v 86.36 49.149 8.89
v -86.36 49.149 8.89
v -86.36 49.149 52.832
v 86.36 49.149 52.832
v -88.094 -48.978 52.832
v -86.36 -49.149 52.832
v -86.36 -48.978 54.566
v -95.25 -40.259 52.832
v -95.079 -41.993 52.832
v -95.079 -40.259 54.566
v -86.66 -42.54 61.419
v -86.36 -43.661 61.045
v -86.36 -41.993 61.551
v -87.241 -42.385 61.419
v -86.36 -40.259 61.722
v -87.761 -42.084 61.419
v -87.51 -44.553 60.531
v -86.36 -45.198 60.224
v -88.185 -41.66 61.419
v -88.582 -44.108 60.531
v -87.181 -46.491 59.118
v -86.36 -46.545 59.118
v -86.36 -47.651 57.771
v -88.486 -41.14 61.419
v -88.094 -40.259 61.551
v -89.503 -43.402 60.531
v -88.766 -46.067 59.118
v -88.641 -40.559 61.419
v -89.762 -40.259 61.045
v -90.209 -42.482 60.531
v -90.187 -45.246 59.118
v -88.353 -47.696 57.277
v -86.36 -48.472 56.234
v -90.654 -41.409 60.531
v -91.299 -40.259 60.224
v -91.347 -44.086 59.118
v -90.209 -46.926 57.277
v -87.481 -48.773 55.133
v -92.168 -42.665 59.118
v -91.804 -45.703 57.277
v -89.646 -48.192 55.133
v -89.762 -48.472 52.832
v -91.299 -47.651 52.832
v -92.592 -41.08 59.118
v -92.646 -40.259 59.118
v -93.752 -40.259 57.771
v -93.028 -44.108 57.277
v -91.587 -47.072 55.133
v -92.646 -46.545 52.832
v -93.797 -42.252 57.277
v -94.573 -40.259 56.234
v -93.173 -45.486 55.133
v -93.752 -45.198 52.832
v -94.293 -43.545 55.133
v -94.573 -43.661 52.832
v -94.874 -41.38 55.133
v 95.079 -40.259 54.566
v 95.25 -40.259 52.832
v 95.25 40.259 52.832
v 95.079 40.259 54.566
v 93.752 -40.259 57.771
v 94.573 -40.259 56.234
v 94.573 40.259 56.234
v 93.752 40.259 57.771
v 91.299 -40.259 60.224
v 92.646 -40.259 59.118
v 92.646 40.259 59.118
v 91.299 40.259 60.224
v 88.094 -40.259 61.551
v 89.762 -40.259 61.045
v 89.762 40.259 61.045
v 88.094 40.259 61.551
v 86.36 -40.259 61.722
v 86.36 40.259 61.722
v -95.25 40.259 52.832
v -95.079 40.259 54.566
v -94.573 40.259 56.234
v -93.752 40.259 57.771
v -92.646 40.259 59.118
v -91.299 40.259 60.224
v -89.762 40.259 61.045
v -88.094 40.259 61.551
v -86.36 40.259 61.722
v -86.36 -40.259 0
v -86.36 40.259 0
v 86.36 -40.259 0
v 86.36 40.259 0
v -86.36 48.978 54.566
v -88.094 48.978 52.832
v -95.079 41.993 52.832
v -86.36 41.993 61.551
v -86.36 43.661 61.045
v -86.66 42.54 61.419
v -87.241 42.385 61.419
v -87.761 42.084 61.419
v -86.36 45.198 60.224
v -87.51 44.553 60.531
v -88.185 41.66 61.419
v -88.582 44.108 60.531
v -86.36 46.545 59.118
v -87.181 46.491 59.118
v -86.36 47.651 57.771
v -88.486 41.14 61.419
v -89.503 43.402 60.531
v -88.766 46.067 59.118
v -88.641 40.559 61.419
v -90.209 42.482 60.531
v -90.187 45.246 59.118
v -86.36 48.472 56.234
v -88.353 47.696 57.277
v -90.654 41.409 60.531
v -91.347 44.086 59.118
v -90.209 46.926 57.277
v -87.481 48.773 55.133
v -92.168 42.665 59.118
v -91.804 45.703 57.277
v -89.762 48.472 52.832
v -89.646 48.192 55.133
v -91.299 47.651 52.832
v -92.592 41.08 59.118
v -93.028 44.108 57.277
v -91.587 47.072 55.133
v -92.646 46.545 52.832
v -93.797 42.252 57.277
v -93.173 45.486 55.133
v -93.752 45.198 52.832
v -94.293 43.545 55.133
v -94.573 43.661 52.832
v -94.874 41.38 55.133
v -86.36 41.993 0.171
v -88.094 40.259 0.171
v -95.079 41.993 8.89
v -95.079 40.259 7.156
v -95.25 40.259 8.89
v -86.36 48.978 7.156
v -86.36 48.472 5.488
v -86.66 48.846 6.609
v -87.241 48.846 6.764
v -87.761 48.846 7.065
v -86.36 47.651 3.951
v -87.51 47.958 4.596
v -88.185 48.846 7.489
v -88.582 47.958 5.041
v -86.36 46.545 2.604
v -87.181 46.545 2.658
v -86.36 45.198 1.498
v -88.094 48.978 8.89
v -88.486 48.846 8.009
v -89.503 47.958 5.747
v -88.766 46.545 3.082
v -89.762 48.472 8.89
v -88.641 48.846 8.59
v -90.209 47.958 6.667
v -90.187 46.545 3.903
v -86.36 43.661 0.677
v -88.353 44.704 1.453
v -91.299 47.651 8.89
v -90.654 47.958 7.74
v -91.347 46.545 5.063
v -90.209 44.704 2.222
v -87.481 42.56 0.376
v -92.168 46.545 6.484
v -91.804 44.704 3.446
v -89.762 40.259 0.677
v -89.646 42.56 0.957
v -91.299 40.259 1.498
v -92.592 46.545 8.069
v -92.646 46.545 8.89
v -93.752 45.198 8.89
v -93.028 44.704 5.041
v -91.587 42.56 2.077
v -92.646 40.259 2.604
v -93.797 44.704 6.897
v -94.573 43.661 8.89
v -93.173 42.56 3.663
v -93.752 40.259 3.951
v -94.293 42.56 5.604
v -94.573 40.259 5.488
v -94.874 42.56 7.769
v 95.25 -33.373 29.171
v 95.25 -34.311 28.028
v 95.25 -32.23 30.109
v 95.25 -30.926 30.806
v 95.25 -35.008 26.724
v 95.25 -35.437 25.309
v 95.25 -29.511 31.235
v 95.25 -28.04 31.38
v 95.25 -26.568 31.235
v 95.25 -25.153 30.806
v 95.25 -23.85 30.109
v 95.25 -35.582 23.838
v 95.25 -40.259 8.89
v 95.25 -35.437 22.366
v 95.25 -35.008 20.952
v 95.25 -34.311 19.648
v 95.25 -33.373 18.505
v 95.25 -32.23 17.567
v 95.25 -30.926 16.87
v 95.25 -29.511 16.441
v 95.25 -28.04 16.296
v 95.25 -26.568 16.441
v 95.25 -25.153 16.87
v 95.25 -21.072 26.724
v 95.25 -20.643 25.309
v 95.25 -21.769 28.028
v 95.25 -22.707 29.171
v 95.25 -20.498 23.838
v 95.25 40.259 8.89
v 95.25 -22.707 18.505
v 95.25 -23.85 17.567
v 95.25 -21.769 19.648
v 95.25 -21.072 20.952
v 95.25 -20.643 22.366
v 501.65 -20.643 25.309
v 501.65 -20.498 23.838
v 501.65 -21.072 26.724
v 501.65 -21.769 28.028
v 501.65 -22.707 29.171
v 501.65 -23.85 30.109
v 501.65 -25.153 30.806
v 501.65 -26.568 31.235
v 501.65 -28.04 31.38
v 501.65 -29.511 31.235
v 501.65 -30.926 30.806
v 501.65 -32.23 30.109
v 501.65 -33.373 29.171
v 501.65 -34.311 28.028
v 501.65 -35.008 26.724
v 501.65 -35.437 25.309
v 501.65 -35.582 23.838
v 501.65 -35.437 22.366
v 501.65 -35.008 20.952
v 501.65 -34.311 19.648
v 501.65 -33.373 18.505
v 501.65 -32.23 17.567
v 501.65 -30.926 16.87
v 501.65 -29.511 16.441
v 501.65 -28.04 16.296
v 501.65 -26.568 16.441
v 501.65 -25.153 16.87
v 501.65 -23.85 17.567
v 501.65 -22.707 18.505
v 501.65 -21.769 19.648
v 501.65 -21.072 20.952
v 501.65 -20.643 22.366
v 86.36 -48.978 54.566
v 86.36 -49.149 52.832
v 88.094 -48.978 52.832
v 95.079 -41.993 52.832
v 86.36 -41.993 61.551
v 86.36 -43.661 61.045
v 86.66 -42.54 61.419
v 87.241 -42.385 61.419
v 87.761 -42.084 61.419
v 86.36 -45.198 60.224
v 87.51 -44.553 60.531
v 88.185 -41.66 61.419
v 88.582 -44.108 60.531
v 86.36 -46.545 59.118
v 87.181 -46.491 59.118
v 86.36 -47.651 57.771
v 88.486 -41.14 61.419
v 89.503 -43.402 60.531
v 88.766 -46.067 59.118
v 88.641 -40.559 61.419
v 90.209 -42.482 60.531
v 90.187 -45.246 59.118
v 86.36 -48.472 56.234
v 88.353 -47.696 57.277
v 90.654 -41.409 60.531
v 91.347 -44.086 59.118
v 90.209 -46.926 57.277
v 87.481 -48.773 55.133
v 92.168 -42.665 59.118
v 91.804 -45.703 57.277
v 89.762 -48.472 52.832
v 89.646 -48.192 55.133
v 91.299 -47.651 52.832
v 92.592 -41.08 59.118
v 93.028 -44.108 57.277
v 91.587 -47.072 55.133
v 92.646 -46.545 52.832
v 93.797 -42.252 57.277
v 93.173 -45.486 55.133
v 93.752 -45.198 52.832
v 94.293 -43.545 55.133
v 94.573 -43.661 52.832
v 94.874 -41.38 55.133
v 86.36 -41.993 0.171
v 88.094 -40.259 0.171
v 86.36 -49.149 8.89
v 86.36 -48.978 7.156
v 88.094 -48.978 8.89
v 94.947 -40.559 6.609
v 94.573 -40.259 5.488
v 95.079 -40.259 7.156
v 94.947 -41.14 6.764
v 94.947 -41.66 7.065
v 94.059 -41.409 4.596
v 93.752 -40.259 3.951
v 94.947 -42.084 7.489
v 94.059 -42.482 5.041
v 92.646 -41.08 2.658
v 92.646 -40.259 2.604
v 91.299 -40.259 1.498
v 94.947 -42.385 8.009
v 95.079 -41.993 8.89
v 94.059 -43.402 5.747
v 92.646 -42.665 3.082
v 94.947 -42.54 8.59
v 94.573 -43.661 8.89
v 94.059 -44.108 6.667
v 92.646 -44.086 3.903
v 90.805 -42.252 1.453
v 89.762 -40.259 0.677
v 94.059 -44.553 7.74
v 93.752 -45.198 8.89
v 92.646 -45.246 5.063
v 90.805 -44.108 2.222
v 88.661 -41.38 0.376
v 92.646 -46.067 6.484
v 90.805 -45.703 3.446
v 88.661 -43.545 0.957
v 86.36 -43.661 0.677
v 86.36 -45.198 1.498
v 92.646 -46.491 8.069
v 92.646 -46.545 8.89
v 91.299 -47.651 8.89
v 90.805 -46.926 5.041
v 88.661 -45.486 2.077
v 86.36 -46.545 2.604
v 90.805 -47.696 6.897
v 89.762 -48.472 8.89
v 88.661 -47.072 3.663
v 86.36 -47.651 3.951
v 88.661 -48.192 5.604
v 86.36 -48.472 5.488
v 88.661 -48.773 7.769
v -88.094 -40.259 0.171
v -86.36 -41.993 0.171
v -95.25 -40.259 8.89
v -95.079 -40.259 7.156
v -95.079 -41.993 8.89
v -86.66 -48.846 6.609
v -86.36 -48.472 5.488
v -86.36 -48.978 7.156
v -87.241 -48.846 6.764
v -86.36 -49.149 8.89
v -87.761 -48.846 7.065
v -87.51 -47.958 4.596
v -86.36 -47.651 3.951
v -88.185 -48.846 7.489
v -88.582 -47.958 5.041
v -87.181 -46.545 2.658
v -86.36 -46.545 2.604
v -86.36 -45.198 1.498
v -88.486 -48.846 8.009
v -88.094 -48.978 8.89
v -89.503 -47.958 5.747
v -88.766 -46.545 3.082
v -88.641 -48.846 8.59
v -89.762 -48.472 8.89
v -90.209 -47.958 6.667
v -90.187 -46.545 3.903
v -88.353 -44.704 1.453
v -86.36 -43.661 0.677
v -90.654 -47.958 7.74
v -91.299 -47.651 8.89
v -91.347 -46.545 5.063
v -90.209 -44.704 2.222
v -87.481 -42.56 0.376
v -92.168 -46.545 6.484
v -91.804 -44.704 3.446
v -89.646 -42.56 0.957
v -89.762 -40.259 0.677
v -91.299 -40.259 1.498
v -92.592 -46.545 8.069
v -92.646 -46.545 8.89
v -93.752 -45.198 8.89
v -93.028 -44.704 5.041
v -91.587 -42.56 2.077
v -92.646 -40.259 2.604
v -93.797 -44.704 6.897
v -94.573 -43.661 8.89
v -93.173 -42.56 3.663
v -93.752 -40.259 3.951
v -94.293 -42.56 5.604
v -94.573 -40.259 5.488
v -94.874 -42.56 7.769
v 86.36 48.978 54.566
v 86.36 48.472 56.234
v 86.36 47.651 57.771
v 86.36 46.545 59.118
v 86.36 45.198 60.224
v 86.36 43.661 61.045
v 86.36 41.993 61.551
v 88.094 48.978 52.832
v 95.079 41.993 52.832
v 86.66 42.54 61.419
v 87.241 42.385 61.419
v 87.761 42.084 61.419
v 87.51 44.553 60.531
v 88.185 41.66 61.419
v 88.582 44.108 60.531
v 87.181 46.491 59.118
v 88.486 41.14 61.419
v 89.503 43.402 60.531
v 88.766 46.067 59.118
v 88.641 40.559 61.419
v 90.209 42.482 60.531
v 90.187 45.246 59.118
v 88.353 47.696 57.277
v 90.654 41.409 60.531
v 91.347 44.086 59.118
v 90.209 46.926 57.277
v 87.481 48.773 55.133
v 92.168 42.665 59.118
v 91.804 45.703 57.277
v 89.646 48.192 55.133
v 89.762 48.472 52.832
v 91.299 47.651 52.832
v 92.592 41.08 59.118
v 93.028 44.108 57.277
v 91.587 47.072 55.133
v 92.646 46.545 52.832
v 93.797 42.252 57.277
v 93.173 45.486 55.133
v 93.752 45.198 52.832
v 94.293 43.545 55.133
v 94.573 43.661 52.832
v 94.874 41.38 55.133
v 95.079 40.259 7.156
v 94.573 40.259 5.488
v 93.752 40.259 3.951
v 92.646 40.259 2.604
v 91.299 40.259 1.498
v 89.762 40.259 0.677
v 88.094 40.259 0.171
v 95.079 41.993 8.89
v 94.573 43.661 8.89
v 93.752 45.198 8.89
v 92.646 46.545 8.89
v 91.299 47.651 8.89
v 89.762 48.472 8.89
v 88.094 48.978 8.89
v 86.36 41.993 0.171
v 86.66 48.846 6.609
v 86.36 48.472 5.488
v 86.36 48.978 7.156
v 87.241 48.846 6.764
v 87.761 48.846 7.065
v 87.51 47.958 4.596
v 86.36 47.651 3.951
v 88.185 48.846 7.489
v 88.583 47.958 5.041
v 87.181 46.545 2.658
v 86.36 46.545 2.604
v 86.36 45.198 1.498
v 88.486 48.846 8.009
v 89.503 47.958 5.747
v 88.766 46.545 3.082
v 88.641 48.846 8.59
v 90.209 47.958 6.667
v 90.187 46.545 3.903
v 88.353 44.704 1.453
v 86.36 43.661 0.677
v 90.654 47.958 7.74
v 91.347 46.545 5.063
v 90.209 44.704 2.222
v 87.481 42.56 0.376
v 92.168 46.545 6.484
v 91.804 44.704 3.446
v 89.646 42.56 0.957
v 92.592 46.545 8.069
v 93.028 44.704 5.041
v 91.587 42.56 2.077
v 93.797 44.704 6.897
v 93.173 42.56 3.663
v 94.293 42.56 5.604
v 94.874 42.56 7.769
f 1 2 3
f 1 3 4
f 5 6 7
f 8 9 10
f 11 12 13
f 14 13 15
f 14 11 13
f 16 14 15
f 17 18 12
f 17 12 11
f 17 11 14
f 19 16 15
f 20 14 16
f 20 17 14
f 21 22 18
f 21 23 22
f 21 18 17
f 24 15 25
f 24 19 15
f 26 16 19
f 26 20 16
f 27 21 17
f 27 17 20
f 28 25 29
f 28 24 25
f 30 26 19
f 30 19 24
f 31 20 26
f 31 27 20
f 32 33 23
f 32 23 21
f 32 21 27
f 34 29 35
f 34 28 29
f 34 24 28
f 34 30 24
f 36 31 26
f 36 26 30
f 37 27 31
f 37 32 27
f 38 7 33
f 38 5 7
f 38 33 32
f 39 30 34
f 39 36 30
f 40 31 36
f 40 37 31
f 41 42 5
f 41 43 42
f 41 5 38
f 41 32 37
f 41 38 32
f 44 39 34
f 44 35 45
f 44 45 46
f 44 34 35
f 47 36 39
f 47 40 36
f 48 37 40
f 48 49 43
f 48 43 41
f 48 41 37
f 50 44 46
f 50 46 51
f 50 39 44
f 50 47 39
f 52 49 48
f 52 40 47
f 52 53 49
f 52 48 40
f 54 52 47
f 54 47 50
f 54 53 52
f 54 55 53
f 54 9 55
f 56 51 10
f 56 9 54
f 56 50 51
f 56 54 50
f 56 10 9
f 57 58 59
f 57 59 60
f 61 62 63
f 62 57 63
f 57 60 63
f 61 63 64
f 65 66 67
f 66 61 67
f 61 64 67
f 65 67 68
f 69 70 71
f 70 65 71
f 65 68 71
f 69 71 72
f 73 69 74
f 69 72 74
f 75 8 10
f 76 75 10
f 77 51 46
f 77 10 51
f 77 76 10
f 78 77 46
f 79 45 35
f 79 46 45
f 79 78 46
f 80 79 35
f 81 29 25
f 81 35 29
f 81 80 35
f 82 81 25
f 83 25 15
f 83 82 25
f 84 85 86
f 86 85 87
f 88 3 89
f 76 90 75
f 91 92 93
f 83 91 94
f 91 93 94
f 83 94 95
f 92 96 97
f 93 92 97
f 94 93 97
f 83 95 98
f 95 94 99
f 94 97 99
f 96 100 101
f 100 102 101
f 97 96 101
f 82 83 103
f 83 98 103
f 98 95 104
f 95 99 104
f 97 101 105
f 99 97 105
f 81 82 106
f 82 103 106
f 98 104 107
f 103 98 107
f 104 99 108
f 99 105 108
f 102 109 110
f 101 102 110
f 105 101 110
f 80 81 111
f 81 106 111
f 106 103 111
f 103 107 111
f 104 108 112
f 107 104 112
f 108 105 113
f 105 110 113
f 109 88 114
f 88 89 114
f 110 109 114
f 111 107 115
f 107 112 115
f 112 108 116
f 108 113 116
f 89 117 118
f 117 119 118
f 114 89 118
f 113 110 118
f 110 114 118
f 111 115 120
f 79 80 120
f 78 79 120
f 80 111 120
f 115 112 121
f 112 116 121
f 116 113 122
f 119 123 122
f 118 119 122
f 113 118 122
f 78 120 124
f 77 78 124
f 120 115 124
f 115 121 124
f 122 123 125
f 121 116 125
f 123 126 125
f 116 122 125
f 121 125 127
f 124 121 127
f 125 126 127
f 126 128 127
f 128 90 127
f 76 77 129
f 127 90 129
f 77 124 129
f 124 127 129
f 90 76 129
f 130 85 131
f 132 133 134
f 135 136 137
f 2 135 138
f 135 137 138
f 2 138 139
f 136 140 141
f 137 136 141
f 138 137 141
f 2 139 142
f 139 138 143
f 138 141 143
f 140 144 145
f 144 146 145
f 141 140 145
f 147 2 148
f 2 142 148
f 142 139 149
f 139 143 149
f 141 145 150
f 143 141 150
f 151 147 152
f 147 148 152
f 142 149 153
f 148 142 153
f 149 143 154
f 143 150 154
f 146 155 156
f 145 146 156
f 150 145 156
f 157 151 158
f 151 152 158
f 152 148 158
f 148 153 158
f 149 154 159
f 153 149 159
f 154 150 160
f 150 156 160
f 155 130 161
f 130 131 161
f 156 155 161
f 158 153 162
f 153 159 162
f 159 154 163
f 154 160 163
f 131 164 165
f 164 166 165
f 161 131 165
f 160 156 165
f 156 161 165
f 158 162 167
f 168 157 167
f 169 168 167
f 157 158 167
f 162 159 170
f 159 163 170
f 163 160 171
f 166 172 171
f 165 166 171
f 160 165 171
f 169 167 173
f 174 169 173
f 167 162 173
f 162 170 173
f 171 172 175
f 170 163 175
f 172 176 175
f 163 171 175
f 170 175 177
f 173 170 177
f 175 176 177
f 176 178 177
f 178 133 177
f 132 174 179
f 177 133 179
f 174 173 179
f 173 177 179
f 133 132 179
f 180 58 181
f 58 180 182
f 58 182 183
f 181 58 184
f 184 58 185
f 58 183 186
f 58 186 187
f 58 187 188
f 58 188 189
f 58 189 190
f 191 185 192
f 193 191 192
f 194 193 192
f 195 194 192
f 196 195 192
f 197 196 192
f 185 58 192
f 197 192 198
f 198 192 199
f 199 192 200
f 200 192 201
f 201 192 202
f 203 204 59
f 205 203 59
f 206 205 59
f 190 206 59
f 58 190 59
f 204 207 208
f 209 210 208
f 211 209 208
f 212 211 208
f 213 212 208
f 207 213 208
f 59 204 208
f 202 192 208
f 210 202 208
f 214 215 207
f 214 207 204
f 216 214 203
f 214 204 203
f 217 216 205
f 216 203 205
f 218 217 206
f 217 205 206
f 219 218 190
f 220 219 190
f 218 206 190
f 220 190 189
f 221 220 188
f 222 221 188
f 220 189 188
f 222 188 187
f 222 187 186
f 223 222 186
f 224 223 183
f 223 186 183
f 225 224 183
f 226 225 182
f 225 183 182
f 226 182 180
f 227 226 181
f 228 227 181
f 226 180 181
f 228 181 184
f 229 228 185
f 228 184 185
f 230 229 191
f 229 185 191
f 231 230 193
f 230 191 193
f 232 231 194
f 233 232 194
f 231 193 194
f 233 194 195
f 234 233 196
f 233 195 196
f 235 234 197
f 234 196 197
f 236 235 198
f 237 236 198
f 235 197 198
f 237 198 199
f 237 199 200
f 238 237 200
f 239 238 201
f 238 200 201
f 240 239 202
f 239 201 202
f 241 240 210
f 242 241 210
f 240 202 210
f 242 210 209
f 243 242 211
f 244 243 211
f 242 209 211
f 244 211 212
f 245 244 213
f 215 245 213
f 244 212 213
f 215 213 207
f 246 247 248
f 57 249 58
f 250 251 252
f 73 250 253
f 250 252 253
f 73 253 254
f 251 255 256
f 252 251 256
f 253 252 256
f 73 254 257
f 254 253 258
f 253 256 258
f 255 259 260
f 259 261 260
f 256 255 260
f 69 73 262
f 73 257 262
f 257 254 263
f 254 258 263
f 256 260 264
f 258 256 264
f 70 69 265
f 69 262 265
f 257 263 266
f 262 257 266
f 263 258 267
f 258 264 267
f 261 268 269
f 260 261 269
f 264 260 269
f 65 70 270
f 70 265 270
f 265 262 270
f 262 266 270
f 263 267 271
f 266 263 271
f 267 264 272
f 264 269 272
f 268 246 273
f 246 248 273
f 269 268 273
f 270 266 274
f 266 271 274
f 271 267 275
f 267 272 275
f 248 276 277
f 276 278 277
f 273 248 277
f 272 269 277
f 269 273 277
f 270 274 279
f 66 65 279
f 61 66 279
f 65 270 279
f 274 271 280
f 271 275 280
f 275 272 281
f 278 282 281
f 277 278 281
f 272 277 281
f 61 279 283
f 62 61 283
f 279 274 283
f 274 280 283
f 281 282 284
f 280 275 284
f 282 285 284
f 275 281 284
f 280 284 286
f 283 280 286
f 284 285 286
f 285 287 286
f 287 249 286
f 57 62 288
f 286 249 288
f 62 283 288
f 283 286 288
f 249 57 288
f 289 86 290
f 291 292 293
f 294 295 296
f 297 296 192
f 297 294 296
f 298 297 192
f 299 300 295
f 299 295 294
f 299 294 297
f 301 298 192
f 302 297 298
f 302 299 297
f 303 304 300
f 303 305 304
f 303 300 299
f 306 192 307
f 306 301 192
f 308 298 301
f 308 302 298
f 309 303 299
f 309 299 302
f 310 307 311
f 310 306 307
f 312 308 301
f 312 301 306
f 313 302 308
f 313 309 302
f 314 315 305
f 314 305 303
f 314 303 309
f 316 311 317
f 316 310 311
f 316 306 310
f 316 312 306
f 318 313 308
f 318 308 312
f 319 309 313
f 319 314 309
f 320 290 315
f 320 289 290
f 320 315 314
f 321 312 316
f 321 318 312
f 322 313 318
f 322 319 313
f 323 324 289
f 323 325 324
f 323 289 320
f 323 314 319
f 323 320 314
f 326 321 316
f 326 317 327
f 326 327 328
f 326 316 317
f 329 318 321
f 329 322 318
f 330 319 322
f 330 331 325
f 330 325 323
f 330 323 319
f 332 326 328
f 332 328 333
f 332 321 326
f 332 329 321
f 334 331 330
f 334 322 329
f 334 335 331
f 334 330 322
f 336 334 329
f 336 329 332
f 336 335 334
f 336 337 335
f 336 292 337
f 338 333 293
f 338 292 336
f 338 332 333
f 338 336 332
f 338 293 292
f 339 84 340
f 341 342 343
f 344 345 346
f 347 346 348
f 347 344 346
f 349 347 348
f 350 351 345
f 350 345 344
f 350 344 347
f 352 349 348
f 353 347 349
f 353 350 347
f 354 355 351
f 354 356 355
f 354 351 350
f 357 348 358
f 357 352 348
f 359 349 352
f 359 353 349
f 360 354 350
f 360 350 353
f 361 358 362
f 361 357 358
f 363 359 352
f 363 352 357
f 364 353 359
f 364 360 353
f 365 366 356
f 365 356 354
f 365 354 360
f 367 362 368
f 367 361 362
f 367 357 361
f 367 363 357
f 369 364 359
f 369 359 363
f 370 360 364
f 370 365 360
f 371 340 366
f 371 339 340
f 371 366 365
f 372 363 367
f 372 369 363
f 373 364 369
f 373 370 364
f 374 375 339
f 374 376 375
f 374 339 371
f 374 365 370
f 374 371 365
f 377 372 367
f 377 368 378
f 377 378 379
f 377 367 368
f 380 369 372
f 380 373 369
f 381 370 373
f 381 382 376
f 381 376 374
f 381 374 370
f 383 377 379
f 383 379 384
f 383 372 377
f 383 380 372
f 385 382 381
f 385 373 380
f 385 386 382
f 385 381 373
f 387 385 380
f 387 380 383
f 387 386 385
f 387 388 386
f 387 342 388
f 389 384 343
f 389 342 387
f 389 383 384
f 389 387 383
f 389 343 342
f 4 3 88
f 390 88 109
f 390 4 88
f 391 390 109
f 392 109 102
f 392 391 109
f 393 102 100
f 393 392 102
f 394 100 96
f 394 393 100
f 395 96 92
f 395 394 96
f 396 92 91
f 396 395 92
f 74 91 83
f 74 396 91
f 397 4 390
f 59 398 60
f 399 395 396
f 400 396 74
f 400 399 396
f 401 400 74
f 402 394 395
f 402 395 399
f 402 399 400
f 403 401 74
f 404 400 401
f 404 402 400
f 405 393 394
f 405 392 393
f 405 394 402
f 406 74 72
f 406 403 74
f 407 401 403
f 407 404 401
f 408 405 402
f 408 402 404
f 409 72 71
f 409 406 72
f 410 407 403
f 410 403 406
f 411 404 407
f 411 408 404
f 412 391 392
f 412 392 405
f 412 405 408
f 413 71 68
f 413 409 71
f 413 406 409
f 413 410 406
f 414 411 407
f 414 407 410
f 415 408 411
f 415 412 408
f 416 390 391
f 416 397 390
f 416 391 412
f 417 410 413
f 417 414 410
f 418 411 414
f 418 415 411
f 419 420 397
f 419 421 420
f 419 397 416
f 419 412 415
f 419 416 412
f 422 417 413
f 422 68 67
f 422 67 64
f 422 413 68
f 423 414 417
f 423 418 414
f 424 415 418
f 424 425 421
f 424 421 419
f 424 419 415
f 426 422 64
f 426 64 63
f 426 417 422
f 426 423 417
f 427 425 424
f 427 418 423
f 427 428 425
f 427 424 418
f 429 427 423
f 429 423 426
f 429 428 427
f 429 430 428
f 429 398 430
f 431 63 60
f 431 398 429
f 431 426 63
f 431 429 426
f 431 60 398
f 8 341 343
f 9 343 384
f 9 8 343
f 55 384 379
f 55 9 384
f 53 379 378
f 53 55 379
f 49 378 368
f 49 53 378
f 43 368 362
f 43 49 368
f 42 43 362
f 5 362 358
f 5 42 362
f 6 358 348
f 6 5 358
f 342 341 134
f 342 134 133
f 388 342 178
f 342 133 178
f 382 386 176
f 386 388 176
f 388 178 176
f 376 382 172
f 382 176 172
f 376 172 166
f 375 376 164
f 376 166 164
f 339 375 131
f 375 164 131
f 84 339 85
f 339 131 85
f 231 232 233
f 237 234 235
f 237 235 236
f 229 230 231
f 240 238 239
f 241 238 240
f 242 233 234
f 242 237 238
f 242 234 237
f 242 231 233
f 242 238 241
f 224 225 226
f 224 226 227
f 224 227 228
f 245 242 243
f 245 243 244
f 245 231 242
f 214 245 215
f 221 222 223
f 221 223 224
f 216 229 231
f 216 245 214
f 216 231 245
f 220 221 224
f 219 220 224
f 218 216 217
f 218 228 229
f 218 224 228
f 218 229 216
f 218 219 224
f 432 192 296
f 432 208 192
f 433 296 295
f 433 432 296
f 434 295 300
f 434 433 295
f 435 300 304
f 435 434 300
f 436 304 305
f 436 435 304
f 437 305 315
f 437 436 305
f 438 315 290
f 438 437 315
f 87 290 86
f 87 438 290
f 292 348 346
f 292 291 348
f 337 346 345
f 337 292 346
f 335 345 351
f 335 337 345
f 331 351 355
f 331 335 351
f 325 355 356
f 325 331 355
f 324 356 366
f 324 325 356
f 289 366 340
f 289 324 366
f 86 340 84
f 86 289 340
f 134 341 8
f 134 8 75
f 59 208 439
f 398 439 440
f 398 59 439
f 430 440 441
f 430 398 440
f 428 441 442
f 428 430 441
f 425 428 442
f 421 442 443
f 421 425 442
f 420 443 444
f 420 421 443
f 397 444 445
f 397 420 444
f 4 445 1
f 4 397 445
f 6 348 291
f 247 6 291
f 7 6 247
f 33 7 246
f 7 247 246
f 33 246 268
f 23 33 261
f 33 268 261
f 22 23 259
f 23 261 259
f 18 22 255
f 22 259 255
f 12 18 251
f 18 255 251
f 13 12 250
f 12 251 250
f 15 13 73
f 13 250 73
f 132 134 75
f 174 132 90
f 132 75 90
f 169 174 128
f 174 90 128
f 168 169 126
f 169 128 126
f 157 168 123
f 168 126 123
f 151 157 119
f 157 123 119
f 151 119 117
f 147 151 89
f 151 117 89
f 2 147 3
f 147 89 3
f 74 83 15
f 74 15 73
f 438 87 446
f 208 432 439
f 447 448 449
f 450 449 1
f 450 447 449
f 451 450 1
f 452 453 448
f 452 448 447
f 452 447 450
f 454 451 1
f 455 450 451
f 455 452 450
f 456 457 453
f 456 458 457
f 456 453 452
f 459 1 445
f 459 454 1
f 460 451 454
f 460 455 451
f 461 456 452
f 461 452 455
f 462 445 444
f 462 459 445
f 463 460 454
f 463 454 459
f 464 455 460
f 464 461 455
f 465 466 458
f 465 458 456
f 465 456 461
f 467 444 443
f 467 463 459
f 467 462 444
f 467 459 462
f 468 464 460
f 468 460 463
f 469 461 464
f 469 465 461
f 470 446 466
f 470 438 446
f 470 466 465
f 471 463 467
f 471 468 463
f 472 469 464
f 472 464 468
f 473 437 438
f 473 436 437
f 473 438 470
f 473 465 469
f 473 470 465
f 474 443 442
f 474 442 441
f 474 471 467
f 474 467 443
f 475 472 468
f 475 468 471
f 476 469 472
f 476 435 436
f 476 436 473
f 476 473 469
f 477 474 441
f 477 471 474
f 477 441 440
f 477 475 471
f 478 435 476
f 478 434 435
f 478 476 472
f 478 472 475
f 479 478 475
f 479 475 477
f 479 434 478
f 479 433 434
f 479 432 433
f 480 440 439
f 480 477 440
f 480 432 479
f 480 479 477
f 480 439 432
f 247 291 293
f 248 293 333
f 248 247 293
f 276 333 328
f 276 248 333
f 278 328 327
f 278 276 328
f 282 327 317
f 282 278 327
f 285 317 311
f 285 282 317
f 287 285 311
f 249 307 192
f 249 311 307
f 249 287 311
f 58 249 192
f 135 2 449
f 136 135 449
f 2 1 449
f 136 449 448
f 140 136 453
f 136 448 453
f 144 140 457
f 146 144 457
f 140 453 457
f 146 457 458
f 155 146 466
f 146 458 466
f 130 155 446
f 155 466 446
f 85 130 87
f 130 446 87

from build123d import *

# Parameters (mm, degrees)
F0_W     = 190.5
F0_H     = 98.298
F1_DEPTH = 61.722
F2_R     = 8.89
F3_R     = 7.542044
F4_DEPTH = 406.4


with BuildPart() as f1:
    # F0 (on Top) → F1 (new body)
    with BuildSketch(Plane.XY):
        Rectangle(F0_W, F0_H)
    extrude(amount=F1_DEPTH)

    # F2
    f2_edges = [f1.edges().sort_by_distance(p)[0] for p in [
        (-95.25, 0, 0),
        (0, -49.149, 0),
        (95.25, 0, 0),
        (0, 49.149, 0),
        (95.25, 49.149, 30.861),
        (-95.25, 49.149, 30.861),
        (0, 49.149, 61.722),
        (-95.25, -49.149, 30.861),
        (95.25, -49.149, 30.861),
        (0, -49.149, 61.722),
        (-95.25, 0, 61.722),
        (95.25, 0, 61.722),
    ]]
    fillet(f2_edges, radius=F2_R)

    # F3 (on face) → F4 (join)
    with BuildSketch(Plane.YZ.offset(95.25)):
        with Locations((-28.03967, 23.837732)):
            Circle(F3_R)
    extrude(amount=F4_DEPTH)


solid = f1.part
